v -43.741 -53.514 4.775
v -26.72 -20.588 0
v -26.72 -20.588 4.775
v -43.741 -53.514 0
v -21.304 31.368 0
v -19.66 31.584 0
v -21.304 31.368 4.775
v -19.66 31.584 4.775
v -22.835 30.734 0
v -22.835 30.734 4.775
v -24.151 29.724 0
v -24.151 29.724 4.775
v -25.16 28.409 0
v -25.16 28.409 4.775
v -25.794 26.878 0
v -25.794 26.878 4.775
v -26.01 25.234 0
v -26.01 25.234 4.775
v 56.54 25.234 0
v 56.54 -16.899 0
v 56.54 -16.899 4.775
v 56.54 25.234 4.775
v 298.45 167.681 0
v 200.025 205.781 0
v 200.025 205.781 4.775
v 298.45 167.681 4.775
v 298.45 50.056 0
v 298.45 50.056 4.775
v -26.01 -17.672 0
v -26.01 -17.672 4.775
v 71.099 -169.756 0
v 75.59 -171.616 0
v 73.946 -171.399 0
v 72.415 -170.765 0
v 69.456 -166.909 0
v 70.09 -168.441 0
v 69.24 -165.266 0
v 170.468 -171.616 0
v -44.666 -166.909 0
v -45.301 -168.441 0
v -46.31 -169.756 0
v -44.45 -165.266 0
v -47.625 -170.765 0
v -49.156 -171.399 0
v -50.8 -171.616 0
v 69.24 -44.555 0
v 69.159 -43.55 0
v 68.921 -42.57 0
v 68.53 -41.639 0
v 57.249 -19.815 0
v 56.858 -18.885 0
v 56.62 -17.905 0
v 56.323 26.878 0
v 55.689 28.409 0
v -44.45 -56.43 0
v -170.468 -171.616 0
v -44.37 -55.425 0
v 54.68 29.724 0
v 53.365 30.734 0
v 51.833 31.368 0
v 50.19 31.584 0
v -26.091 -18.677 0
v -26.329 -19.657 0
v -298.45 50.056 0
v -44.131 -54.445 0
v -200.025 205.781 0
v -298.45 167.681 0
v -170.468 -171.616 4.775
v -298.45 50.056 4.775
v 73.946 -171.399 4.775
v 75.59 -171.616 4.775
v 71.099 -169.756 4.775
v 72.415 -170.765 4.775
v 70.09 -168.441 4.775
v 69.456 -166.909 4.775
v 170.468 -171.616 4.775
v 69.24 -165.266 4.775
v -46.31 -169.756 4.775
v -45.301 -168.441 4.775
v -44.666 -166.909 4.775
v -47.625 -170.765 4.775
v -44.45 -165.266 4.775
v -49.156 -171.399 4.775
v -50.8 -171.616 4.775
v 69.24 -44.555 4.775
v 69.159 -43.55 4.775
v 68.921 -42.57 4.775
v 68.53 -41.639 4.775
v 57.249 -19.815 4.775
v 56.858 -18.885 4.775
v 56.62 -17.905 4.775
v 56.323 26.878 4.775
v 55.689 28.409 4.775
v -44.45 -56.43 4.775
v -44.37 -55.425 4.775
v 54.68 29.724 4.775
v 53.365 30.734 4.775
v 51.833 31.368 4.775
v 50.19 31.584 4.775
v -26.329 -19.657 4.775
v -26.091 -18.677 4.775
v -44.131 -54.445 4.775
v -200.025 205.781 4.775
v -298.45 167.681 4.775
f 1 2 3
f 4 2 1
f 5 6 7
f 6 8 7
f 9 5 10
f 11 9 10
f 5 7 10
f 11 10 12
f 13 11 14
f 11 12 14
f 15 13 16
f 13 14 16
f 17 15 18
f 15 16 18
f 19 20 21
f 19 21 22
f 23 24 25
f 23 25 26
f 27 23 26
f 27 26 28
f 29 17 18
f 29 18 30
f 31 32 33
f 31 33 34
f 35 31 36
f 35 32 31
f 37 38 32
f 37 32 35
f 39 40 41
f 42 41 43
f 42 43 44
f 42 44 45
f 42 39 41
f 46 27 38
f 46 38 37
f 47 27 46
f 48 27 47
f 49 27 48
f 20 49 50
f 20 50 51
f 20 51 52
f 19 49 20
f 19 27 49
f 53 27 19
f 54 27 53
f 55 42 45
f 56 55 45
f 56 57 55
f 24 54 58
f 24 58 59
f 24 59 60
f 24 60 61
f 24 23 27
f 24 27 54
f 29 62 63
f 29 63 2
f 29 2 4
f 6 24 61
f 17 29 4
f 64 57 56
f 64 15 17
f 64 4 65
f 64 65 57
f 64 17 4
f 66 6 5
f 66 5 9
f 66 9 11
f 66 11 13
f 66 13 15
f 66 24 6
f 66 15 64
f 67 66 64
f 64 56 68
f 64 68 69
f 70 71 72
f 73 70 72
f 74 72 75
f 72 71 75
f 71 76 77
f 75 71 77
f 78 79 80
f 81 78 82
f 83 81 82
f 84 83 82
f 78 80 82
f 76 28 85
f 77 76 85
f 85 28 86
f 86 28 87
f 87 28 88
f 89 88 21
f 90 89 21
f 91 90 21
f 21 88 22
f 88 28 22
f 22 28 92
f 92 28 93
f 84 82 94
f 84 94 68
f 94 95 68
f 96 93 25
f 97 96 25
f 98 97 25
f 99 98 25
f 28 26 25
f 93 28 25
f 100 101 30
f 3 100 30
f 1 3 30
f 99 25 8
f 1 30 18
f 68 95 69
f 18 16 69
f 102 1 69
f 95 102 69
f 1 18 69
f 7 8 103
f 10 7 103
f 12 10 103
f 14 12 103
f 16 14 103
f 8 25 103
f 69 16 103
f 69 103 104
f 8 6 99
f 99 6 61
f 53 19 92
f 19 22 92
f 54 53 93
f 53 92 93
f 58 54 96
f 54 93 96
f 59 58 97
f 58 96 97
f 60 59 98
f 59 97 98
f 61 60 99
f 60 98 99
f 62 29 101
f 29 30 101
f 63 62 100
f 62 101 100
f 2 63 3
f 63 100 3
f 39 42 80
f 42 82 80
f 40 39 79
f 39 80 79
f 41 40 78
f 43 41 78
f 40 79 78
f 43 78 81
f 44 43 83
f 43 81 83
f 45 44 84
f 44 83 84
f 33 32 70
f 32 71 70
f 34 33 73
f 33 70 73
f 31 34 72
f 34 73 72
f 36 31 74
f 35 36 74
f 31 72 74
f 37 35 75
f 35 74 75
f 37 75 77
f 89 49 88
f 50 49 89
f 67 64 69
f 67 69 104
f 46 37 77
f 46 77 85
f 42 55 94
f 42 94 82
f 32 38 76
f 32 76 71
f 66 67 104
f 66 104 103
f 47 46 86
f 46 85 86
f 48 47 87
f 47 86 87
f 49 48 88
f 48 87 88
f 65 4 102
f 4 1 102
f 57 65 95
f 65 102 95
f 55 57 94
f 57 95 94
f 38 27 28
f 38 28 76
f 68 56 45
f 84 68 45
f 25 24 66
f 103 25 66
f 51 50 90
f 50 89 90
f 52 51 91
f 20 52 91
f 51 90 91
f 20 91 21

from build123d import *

# Parameters (mm, degrees)
BOSS_EXTRUDE1_DEPTH = 4.7752
FILLET1_R           = 6.35


with BuildPart() as part:
    # Sketch1 → Boss-Extrude1 (new body)
    with BuildSketch(Plane.XY):
        Polygon((170.467651581, -171.615744818), (69.239557334, -171.615744818), (69.239557334, -43.011155522), (56.539557334, -18.443630812), (56.539557334, 31.584255182), (50.8, 31.584255182), (-26.010442666, 31.584255182), (-26.010442666, -19.215744818), (-44.45, -54.886160601), (-44.45, -171.615744818), (-63.5, -171.615744818), (-170.467651581, -171.615744818), (-298.45, 50.056185115), (-298.45, 167.681366782), (-200.025, 205.781366782), (-63.5, 205.781366782), (63.5, 205.781366782), (200.025, 205.781366782), (298.45, 167.681366782), (298.45, 50.056185115), align=None)
    extrude(amount=BOSS_EXTRUDE1_DEPTH)

    # Fillet1
    fillet1_edges = [part.edges().sort_by_distance(p)[0] for p in [
        (69.239557334, -171.615744818, 2.3876),
        (69.239557334, -43.011155522, 2.3876),
        (56.539557334, -18.443630812, 2.3876),
        (56.539557334, 31.584255182, 2.3876),
        (-26.010442666, 31.584255182, 2.3876),
        (-26.010442666, -19.215744818, 2.3876),
        (-44.45, -54.886160601, 2.3876),
        (-44.45, -171.615744818, 2.3876),
    ]]
    fillet(fillet1_edges, radius=FILLET1_R)


solid = part.part
